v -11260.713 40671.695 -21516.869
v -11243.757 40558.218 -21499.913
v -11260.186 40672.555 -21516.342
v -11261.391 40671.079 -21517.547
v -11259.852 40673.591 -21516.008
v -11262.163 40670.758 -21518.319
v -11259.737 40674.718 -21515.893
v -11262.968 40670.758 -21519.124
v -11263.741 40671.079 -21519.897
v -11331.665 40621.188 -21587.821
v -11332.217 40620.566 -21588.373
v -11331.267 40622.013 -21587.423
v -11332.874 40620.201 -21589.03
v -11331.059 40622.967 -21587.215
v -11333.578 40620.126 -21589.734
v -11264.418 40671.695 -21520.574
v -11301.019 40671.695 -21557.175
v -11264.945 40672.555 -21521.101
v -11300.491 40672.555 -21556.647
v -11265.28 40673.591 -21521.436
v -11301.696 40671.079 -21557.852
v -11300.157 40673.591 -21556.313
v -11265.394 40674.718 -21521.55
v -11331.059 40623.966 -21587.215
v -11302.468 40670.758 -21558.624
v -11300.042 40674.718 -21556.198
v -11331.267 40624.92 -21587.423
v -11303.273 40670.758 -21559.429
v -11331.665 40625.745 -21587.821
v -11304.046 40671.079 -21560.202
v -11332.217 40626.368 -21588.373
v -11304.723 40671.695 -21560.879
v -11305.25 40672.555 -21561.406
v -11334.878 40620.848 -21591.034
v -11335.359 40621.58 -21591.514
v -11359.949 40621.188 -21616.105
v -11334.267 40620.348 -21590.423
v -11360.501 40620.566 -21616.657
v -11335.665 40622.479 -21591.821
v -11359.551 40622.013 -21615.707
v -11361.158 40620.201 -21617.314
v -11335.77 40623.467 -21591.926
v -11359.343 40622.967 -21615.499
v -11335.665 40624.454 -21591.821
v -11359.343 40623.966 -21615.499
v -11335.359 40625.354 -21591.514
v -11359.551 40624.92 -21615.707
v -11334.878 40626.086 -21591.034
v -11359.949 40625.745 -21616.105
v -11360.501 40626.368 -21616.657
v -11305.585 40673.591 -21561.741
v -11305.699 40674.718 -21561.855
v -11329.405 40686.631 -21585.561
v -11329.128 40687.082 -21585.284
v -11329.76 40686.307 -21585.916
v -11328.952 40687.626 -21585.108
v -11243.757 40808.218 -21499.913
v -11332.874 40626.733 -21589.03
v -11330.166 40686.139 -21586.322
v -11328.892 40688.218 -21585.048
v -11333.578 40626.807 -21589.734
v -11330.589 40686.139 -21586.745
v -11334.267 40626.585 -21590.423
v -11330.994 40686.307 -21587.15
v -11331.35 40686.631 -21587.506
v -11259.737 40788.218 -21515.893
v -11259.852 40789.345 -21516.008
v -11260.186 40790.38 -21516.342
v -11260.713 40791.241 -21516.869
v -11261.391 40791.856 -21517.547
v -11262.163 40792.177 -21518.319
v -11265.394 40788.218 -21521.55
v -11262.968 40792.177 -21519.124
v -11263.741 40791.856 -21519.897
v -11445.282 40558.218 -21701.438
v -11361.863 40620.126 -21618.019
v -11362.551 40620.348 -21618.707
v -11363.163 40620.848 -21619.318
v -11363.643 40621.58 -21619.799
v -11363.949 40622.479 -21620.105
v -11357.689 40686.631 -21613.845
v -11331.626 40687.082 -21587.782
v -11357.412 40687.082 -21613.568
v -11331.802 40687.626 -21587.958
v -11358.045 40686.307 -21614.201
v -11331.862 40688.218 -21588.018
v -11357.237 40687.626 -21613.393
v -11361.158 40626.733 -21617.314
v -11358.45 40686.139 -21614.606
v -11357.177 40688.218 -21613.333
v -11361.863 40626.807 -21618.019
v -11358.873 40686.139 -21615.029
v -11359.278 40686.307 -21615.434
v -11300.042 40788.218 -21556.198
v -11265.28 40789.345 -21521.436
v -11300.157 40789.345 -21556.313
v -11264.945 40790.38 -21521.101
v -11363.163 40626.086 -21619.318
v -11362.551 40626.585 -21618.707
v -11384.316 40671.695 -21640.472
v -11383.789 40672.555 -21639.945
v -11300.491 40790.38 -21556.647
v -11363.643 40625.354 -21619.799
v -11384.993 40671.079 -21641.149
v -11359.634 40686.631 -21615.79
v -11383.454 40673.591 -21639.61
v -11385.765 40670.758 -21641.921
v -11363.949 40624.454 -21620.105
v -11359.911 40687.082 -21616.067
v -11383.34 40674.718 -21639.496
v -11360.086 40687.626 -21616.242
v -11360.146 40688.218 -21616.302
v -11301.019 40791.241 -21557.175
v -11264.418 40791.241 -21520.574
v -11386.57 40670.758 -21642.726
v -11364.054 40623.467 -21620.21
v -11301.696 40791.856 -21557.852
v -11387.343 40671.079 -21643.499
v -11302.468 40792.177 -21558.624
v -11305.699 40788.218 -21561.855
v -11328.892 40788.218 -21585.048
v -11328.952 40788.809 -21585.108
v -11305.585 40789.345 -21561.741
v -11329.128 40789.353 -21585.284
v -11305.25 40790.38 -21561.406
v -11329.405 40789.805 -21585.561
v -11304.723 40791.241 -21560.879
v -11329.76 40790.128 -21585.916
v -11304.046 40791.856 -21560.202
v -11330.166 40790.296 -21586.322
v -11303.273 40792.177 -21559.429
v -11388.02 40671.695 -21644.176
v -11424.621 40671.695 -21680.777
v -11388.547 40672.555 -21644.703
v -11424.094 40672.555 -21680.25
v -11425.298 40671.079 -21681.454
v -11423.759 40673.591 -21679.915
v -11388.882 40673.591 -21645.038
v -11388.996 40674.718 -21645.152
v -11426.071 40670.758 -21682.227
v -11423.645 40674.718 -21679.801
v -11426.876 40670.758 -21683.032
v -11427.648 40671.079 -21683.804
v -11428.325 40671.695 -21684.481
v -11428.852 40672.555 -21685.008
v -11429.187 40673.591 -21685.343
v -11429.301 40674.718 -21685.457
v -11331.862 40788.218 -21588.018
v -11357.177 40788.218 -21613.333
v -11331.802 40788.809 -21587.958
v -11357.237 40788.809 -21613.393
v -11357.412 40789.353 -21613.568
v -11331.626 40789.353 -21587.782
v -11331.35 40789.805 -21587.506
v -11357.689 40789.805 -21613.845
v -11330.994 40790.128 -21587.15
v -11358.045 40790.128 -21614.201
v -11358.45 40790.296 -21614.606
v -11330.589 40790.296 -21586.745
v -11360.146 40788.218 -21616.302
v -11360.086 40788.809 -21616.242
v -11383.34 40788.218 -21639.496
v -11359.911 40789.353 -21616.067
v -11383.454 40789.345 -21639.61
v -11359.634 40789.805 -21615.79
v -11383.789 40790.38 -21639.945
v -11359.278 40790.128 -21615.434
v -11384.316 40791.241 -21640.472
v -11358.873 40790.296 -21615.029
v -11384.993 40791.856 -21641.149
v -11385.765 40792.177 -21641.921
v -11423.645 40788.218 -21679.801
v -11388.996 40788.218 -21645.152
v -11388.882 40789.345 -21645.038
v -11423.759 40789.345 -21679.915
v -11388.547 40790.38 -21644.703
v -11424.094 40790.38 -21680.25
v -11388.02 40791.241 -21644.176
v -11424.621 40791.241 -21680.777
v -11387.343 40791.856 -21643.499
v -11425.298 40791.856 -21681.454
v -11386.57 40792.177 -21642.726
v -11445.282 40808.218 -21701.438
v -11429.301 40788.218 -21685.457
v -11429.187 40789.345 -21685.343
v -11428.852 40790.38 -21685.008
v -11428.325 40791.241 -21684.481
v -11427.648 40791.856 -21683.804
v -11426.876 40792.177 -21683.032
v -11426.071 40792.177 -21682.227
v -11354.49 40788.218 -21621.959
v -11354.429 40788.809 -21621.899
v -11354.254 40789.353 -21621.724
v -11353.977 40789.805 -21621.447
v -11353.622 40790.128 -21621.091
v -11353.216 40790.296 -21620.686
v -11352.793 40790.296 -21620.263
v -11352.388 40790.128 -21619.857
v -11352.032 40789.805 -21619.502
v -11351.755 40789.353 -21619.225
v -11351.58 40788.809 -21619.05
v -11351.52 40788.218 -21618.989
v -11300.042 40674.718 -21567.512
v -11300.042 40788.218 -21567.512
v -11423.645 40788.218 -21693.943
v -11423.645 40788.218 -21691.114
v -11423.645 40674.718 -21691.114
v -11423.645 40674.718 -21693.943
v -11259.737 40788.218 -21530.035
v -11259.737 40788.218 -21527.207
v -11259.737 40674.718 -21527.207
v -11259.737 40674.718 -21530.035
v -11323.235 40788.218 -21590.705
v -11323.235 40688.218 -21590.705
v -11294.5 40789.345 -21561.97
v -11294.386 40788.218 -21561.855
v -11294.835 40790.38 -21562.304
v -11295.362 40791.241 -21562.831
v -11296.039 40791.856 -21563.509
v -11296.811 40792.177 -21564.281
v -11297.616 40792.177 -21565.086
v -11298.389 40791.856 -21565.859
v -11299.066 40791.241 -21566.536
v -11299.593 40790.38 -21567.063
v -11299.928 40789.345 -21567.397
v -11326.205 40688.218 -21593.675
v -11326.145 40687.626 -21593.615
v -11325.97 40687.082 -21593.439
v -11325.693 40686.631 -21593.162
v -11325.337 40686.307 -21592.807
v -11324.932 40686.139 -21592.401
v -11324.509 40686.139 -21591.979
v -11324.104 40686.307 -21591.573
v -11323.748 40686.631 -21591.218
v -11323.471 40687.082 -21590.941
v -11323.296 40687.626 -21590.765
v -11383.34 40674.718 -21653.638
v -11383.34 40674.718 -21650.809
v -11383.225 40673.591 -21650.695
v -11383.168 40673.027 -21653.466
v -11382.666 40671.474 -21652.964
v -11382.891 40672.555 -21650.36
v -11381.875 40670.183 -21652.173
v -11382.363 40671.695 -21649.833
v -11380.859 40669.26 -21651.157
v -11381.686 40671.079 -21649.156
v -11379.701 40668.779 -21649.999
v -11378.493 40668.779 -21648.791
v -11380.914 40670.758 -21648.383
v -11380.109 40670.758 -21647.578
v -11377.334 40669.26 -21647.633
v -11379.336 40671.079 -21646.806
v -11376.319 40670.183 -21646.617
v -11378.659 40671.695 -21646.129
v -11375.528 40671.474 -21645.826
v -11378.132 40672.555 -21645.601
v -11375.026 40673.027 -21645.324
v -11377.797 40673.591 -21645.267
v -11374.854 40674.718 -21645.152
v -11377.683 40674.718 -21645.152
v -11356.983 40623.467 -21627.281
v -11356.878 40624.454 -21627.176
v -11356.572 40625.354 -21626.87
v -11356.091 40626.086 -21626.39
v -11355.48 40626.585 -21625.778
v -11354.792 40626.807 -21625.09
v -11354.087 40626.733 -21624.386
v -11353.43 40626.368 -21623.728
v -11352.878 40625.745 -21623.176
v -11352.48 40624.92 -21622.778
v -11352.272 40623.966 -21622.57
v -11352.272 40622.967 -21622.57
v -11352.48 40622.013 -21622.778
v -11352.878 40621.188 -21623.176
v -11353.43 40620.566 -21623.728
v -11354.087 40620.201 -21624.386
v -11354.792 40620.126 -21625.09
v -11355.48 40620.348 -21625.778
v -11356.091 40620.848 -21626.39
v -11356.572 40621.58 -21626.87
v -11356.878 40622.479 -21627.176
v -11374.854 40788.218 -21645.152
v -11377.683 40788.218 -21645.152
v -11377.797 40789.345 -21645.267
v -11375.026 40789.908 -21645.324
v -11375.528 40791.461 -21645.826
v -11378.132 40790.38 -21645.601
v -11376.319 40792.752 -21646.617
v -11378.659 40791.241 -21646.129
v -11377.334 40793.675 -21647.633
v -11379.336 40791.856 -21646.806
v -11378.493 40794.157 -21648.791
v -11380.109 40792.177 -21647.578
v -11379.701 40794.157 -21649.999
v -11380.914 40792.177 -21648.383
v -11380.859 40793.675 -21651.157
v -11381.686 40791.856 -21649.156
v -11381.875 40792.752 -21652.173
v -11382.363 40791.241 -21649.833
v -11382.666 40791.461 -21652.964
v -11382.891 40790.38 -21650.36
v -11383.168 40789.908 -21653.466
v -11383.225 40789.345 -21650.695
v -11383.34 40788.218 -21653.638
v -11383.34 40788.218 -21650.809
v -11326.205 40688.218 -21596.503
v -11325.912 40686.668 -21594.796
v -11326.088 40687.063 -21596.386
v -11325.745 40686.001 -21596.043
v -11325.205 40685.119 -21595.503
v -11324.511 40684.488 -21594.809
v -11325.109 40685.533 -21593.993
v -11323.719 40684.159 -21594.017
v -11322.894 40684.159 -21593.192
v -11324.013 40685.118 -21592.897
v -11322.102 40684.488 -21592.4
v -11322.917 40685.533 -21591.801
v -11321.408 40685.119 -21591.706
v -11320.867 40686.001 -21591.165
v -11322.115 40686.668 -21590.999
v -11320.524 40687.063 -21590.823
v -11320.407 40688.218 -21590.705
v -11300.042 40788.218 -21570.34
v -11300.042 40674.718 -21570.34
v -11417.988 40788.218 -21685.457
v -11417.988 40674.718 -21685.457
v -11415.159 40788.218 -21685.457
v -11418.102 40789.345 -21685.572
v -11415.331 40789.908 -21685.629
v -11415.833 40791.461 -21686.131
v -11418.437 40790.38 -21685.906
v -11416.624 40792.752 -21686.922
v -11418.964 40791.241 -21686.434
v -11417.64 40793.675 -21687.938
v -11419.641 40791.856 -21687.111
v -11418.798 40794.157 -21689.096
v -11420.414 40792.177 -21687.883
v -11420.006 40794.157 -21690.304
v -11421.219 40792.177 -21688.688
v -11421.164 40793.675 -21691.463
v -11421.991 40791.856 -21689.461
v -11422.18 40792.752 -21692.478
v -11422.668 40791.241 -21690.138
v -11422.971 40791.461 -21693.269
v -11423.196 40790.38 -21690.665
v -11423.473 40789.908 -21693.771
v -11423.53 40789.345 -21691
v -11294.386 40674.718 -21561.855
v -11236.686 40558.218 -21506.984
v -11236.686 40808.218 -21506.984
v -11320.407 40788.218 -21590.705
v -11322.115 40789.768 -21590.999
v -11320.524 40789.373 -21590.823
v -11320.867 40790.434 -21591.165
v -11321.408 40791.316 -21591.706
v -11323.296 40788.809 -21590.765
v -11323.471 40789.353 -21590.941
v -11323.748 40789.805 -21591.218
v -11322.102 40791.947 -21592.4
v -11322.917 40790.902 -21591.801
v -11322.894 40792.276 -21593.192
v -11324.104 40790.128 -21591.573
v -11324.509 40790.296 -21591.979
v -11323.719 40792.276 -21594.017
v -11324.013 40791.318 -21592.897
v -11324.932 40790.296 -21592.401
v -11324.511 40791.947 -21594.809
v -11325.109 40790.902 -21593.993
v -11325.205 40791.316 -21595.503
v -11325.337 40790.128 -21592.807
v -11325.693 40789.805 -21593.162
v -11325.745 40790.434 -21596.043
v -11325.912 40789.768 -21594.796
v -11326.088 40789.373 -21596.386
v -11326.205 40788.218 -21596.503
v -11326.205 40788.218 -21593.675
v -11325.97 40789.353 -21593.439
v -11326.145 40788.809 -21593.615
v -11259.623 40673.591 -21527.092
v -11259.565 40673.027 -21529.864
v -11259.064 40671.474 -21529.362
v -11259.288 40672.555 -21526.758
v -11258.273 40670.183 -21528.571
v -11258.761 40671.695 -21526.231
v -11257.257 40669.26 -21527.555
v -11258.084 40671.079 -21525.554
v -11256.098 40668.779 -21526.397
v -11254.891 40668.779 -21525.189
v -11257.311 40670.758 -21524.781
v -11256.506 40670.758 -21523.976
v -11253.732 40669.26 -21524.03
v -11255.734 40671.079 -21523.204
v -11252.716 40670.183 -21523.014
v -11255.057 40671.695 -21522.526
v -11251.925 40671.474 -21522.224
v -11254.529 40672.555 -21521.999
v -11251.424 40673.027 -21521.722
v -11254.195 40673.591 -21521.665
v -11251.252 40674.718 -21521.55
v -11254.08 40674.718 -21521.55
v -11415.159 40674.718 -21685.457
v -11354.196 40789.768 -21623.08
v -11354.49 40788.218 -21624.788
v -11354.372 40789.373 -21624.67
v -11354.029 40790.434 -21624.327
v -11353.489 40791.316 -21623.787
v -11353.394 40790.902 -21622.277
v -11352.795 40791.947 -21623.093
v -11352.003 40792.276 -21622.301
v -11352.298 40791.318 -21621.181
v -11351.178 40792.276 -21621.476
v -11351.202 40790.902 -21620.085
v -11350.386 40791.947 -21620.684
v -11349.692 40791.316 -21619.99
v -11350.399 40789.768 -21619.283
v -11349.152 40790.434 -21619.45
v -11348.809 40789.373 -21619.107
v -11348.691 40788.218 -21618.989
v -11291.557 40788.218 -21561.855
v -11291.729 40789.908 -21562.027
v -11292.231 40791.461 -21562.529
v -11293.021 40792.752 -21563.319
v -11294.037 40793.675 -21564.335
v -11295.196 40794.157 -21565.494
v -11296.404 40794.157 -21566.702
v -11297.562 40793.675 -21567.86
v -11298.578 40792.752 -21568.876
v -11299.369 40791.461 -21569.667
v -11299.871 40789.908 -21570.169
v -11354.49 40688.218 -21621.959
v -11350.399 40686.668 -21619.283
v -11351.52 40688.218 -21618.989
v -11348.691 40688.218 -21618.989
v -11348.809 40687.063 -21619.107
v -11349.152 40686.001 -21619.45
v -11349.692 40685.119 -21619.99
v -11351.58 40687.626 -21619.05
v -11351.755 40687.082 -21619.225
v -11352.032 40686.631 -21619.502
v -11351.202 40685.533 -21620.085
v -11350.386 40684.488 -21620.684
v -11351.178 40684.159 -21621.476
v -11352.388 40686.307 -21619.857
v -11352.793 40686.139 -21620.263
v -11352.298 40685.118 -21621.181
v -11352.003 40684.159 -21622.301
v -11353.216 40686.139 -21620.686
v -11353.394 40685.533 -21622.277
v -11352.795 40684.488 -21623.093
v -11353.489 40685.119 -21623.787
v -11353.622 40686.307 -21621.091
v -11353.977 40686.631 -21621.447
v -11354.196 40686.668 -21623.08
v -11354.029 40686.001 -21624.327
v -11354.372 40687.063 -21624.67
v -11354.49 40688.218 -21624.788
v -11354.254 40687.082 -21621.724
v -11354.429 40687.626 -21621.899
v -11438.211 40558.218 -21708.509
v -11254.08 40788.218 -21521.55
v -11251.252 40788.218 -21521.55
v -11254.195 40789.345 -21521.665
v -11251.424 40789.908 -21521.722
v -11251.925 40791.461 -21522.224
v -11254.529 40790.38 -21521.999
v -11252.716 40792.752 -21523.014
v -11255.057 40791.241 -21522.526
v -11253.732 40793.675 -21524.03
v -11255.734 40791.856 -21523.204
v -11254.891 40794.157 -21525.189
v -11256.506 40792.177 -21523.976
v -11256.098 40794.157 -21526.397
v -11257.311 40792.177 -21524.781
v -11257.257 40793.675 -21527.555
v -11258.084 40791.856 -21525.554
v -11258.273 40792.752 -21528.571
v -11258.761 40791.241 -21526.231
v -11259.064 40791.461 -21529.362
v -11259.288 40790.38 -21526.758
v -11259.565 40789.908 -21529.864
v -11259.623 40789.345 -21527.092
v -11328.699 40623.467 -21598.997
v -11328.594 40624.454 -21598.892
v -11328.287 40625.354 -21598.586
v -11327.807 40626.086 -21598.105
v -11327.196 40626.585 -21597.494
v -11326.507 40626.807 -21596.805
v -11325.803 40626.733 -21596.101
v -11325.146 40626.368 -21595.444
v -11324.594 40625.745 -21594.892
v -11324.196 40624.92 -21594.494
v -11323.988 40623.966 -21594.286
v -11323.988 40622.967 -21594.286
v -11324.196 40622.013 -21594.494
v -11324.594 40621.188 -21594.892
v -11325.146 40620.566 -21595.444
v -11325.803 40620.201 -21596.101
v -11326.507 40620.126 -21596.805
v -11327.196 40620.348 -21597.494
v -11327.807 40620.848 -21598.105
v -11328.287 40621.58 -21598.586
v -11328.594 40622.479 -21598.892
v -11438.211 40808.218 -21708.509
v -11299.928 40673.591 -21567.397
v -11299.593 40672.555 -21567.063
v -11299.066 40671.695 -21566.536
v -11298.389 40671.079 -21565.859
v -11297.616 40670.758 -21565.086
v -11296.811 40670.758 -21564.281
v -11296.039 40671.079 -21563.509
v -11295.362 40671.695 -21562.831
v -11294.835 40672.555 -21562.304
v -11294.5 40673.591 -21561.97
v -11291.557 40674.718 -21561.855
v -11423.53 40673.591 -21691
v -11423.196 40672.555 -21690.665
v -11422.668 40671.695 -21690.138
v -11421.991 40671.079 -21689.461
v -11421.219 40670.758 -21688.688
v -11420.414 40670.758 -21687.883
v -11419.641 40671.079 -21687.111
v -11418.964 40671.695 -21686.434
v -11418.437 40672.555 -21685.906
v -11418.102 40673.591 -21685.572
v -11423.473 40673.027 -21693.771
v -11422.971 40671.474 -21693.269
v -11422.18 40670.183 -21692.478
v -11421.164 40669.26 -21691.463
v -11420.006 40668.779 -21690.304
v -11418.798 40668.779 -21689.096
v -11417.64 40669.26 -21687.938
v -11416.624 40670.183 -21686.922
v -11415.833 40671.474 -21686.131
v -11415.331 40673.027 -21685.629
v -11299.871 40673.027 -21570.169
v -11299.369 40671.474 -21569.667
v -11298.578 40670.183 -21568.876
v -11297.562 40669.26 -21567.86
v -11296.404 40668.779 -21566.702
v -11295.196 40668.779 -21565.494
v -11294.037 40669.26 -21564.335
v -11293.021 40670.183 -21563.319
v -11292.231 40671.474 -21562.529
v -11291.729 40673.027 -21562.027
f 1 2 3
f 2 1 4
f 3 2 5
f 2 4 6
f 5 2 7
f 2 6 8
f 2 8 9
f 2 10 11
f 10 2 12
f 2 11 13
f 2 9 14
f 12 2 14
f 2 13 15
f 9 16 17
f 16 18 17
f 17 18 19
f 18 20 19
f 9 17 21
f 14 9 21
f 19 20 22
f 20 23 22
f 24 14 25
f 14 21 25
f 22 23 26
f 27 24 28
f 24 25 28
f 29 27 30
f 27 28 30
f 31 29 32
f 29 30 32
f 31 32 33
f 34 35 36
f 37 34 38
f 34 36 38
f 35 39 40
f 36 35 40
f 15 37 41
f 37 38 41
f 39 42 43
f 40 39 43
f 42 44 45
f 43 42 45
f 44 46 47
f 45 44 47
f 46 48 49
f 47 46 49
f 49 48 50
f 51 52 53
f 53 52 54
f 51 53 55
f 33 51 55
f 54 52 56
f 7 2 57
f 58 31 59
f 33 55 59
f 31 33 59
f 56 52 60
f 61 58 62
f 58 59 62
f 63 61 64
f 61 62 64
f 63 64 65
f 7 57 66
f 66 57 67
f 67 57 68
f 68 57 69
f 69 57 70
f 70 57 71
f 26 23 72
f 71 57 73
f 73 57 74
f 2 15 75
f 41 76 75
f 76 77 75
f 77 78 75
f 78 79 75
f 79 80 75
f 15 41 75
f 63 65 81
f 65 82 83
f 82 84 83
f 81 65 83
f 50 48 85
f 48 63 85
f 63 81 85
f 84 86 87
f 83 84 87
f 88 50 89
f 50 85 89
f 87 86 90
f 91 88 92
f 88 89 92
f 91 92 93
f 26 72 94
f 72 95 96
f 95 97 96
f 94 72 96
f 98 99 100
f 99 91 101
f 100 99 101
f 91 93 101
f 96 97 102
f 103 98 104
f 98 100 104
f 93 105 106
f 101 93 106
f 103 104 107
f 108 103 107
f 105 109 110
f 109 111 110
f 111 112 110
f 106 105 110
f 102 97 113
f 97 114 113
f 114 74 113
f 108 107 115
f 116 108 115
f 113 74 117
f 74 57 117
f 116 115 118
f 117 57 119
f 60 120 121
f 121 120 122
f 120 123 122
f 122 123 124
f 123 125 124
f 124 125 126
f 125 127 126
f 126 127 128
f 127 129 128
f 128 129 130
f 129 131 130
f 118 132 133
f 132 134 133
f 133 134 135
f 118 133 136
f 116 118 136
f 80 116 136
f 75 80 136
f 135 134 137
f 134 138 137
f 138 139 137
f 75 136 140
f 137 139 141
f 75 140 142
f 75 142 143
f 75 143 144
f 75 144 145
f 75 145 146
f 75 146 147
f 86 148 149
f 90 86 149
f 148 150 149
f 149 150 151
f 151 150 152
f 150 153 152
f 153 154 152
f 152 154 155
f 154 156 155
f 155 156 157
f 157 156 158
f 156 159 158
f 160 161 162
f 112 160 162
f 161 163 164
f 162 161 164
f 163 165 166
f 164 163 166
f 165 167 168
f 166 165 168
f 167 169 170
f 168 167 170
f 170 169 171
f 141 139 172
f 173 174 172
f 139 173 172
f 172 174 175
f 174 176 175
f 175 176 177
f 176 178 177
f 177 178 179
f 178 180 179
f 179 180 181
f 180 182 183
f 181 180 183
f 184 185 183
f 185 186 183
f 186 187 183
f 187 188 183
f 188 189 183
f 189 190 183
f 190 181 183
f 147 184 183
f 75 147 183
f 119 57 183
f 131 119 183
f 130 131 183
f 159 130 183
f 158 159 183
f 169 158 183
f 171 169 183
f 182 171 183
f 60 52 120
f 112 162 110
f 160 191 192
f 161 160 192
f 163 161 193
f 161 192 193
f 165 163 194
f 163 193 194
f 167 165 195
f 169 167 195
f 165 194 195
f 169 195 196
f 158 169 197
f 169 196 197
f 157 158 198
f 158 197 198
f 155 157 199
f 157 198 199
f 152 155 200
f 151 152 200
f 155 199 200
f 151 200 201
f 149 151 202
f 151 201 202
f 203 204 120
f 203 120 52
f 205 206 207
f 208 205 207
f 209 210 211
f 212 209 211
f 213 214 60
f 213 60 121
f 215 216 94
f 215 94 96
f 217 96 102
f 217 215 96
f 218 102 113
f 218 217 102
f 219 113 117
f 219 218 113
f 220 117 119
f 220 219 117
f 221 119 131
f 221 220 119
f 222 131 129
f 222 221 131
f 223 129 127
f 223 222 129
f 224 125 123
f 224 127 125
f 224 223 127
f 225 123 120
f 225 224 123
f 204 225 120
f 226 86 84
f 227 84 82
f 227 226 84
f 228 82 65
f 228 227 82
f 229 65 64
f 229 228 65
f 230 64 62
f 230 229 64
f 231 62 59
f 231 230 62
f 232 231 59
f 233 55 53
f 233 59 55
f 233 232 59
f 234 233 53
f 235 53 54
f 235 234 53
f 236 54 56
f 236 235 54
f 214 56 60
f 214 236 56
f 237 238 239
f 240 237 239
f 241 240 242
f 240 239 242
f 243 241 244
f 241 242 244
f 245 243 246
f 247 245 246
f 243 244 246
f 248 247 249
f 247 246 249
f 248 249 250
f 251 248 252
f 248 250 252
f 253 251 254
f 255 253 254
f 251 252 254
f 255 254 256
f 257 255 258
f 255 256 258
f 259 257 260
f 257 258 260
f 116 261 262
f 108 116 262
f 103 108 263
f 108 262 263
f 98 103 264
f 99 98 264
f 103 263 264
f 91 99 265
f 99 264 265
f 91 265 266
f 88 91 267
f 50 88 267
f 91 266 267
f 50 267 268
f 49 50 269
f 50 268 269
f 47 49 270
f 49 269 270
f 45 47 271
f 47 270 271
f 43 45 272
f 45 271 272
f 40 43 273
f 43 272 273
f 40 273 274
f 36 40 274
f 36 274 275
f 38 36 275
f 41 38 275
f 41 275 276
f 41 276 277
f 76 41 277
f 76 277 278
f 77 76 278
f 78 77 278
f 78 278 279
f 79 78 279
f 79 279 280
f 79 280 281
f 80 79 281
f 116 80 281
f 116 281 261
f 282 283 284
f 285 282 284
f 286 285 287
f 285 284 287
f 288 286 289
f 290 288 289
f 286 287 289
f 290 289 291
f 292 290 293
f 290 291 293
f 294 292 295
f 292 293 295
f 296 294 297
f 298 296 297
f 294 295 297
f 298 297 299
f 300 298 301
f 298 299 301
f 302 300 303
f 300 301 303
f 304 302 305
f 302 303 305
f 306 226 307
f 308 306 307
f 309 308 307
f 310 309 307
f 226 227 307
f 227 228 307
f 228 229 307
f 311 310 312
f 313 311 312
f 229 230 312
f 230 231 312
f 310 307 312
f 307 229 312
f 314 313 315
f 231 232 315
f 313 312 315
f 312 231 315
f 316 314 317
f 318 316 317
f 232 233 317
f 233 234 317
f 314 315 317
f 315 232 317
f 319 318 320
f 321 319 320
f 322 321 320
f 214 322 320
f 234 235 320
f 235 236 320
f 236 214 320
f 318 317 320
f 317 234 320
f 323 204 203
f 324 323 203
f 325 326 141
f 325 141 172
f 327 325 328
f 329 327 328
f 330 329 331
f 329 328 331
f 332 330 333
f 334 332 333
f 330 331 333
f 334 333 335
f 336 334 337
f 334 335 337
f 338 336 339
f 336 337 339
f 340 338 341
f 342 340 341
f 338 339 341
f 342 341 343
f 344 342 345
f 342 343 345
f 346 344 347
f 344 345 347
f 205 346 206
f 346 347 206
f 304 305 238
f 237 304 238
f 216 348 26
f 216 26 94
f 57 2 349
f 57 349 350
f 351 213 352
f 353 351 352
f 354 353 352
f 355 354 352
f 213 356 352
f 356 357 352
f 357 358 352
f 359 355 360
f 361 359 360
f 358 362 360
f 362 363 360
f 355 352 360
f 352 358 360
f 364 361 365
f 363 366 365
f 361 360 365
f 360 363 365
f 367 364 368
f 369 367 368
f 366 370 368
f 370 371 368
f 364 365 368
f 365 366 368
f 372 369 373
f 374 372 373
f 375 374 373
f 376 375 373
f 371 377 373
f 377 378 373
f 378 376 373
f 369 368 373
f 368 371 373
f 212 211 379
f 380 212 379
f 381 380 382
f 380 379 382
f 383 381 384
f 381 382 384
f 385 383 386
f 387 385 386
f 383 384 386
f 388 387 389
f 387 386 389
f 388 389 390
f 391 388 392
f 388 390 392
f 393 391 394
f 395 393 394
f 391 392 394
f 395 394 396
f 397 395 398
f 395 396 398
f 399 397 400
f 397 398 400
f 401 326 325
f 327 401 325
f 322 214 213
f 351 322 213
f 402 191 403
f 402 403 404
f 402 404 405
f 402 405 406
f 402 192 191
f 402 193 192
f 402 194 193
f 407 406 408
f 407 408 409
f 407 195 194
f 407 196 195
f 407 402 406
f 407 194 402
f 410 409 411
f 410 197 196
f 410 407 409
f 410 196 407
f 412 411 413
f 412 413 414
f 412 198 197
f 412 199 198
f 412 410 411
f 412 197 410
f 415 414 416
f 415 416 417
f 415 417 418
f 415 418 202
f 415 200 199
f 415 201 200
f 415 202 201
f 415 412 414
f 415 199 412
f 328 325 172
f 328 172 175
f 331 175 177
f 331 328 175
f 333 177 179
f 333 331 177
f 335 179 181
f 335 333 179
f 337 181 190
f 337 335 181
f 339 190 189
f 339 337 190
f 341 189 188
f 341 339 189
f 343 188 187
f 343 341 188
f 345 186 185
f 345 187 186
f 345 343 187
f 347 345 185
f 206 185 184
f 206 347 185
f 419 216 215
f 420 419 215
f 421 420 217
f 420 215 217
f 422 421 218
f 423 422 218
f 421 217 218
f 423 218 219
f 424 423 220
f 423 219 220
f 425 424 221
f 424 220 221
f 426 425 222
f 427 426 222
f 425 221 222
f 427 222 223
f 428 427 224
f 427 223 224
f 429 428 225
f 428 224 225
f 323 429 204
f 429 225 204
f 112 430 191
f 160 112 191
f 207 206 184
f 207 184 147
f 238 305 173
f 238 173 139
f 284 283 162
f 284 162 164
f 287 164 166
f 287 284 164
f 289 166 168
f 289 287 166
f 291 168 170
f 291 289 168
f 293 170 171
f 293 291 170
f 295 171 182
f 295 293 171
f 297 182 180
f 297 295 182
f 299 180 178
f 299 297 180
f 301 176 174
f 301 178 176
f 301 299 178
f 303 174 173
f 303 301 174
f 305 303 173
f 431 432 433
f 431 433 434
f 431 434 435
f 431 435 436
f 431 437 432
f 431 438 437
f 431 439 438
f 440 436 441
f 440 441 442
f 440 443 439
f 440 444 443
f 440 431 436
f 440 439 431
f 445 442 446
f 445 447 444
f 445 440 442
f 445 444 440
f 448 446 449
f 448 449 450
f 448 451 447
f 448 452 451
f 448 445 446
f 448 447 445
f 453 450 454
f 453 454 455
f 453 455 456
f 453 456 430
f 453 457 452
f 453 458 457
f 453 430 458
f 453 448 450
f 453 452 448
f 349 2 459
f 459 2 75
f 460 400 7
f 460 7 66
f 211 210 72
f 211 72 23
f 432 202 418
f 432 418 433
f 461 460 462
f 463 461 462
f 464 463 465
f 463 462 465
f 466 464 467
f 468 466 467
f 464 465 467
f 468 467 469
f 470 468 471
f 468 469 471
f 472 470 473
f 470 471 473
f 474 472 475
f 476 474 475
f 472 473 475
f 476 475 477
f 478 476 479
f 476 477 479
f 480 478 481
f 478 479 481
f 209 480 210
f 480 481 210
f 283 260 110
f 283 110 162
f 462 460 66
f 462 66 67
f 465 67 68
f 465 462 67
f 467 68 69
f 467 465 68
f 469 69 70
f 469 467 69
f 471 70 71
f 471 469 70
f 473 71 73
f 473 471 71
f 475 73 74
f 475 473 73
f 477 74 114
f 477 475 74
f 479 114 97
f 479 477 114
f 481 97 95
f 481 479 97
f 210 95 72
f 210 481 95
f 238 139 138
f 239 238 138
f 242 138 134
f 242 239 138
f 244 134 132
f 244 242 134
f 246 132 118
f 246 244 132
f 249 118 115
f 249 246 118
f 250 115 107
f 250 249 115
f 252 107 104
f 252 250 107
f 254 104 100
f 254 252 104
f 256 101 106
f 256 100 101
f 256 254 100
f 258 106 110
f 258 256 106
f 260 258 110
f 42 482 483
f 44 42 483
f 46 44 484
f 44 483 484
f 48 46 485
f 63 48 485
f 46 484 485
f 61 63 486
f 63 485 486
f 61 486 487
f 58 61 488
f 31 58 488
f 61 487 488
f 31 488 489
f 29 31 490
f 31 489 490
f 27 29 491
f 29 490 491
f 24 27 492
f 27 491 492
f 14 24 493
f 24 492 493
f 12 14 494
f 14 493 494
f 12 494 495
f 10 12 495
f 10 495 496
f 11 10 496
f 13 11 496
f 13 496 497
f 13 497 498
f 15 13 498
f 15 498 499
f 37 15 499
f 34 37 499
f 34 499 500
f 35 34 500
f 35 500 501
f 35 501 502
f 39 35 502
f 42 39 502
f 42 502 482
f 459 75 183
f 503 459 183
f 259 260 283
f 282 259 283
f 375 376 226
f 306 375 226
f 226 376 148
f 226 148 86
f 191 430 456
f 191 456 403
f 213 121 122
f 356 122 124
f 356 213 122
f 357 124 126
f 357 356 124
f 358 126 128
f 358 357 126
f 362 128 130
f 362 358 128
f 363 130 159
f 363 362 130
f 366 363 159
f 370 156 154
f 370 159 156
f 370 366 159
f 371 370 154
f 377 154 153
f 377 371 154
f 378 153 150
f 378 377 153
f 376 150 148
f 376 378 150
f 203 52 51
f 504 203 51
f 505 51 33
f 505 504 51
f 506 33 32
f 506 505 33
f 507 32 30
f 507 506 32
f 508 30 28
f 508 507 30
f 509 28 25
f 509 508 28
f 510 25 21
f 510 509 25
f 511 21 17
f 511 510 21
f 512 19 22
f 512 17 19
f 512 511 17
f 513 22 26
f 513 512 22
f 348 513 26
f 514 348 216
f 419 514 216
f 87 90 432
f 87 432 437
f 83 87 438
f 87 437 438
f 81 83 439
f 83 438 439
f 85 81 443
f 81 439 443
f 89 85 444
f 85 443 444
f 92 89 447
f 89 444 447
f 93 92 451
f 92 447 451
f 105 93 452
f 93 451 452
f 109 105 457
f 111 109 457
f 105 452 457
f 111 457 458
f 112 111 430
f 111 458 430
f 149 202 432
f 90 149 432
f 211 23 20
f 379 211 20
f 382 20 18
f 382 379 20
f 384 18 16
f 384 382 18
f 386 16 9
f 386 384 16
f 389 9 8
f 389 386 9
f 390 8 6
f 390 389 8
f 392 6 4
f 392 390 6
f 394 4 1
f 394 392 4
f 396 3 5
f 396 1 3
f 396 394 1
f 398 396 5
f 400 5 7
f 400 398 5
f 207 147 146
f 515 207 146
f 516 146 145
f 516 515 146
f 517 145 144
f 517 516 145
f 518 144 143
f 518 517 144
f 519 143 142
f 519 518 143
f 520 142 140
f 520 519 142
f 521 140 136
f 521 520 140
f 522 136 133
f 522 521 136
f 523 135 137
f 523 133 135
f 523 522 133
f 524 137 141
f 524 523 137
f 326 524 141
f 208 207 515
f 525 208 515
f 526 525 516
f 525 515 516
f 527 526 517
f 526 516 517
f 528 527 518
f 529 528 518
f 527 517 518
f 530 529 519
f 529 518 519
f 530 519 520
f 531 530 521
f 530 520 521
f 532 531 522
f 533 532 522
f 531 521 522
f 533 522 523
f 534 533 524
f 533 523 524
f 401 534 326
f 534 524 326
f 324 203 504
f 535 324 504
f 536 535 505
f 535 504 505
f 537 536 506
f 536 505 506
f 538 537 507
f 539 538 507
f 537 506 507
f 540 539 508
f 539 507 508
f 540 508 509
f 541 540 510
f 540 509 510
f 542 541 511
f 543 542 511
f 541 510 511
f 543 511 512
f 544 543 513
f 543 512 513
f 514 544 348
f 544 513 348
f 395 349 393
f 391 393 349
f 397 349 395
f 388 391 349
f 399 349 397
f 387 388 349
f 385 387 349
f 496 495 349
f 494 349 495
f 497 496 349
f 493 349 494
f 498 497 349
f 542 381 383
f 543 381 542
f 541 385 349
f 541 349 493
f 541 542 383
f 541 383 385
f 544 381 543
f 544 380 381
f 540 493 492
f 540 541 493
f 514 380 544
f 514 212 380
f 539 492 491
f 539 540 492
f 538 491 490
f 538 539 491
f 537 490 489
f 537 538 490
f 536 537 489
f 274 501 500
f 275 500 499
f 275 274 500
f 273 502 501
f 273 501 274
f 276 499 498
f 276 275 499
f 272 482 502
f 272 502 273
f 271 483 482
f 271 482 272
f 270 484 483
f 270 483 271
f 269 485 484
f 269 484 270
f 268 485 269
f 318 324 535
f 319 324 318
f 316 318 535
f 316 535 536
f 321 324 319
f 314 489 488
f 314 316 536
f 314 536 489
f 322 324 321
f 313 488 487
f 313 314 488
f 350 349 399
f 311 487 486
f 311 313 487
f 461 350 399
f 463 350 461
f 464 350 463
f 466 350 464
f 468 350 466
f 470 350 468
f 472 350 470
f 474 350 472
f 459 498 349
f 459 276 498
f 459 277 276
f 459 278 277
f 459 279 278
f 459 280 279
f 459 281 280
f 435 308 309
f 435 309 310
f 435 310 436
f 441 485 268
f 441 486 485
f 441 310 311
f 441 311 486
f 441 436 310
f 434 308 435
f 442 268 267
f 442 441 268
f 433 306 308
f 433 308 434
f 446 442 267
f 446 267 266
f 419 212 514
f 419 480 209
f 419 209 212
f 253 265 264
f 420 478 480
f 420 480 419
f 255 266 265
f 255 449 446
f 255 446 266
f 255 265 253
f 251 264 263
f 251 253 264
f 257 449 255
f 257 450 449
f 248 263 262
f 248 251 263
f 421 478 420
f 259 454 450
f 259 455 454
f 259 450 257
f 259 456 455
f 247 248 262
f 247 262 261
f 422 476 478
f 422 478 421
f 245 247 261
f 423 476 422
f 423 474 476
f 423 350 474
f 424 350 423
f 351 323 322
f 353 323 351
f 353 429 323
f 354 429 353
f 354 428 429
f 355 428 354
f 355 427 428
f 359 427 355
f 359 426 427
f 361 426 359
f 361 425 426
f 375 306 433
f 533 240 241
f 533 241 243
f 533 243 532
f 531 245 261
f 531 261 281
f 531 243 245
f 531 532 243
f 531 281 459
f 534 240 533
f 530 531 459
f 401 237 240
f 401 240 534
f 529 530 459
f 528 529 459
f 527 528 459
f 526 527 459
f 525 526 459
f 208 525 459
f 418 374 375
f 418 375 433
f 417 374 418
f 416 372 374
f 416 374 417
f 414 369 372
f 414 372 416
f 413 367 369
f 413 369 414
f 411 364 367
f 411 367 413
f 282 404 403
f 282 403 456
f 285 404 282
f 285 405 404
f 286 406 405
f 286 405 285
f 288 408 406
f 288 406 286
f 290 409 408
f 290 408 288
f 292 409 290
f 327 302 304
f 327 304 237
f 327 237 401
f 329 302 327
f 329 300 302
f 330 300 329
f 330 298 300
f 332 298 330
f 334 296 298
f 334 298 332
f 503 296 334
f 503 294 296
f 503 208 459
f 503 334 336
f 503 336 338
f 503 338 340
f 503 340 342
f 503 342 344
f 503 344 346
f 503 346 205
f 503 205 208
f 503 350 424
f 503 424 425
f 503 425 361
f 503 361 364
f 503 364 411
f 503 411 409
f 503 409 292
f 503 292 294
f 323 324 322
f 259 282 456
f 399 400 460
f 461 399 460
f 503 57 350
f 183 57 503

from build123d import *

# Parameters (mm, degrees)
SKETCH1_W               = 285
SKETCH1_H               = 250
BOSS_EXTRUDE1_DEPTH     = 10
CUT_EXTRUDE1_DEPTH      = 143.5
CUT_EXTRUDE1_DEPTH_BACK = 153.5
CHAMFER1_SIZE           = 2
SKETCH6_R               = 3.35
CUT_EXTRUDE4_DEPTH      = 153.5


with BuildPart() as part:
    # Sketch1 → Boss-Extrude1 (new body)
    with BuildSketch(Plane(origin=(5128.077990588, 0, -5128.077990588), x_dir=(-0.707106781, 0, -0.707106781), z_dir=(0.707106781, 0, -0.707106781))):
        with Locations((23295.770603259, 40683.217604407)):
            Rectangle(SKETCH1_W, SKETCH1_H)
    extrude(amount=BOSS_EXTRUDE1_DEPTH)

    # Sketch2 → Cut-Extrude1 (cut, two sides)
    with BuildSketch(Plane(origin=(5135.1490584, 0, -5135.1490584), x_dir=(-0.707106781, 0, -0.707106781), z_dir=(0.707106781, 0, -0.707106781))) as cut_extrude1_sk:
        with BuildLine():
            Line((23183.870603259, 40788.217604407), (23183.870603259, 40674.717604407))
            ThreePointArc((23183.870603259, 40674.717604407), (23179.870603259, 40670.717604407), (23175.870603259, 40674.717604407))
            Line((23175.870603259, 40674.717604407), (23175.870603259, 40788.217604407))
            ThreePointArc((23175.870603259, 40788.217604407), (23179.870603259, 40792.217604407), (23183.870603259, 40788.217604407))
        make_face()
        with BuildLine():
            Line((23358.670603259, 40788.217604407), (23358.670603259, 40674.717604407))
            ThreePointArc((23358.670603259, 40674.717604407), (23354.670603259, 40670.717604407), (23350.670603259, 40674.717604407))
            Line((23350.670603259, 40674.717604407), (23350.670603259, 40788.217604407))
            ThreePointArc((23350.670603259, 40788.217604407), (23354.670603259, 40792.217604407), (23358.670603259, 40788.217604407))
        make_face()
        with BuildLine():
            Line((23240.870603259, 40788.217604407), (23240.870603259, 40674.717604407))
            ThreePointArc((23240.870603259, 40674.717604407), (23236.870603259, 40670.717604407), (23232.870603259, 40674.717604407))
            Line((23232.870603259, 40674.717604407), (23232.870603259, 40788.217604407))
            ThreePointArc((23232.870603259, 40788.217604407), (23236.870603259, 40792.217604407), (23240.870603259, 40788.217604407))
        make_face()
        with BuildLine():
            Line((23415.670603259, 40788.217604407), (23415.670603259, 40674.717604407))
            ThreePointArc((23415.670603259, 40674.717604407), (23411.670603259, 40670.717604407), (23407.670603259, 40674.717604407))
            Line((23407.670603259, 40674.717604407), (23407.670603259, 40788.217604407))
            ThreePointArc((23407.670603259, 40788.217604407), (23411.670603259, 40792.217604407), (23415.670603259, 40788.217604407))
        make_face()
        with BuildLine():
            Line((23277.870603259, 40788.217604407), (23277.870603259, 40688.217604407))
            ThreePointArc((23277.870603259, 40688.217604407), (23275.770603259, 40686.117604407), (23273.670603259, 40688.217604407))
            Line((23273.670603259, 40688.217604407), (23273.670603259, 40788.217604407))
            ThreePointArc((23273.670603259, 40788.217604407), (23275.770603259, 40790.317604407), (23277.870603259, 40788.217604407))
        make_face()
        with BuildLine():
            Line((23313.670603259, 40788.217604407), (23313.670603259, 40688.217604407))
            ThreePointArc((23313.670603259, 40688.217604407), (23315.770603259, 40686.117604407), (23317.870603259, 40688.217604407))
            Line((23317.870603259, 40688.217604407), (23317.870603259, 40788.217604407))
            ThreePointArc((23317.870603259, 40788.217604407), (23315.770603259, 40790.317604407), (23313.670603259, 40788.217604407))
        make_face()
    extrude(amount=CUT_EXTRUDE1_DEPTH, mode=Mode.SUBTRACT)
    extrude(cut_extrude1_sk.sketch, amount=-CUT_EXTRUDE1_DEPTH_BACK, mode=Mode.SUBTRACT)

    # Chamfer1
    chamfer1_edges = [part.edges().sort_by_distance(p)[0] for p in [
        (-11323.306172507, 40790.317604407, -21593.604289307),
        (-11324.791096747, 40738.217604407, -21595.089213547),
        (-11323.306172507, 40686.117604407, -21593.604289307),
        (-11321.821248266, 40738.217604407, -21592.119365066),
        (-11419.40198407, 40792.217604407, -21689.70010087),
        (-11422.230411195, 40731.467604407, -21692.528527995),
        (-11419.40198407, 40670.717604407, -21689.70010087),
        (-11416.573556945, 40731.467604407, -21686.871673745),
        (-11379.096897542, 40792.217604407, -21649.395014342),
        (-11381.925324667, 40731.467604407, -21652.223441467),
        (-11379.096897542, 40670.717604407, -21649.395014342),
        (-11376.268470418, 40731.467604407, -21646.566587218),
        (-11295.799718719, 40792.217604407, -21566.097835519),
        (-11298.628145844, 40731.467604407, -21568.926262643),
        (-11295.799718719, 40670.717604407, -21566.097835519),
        (-11292.971291594, 40731.467604407, -21563.269408394),
        (-11351.590443754, 40790.317604407, -21621.888560554),
        (-11353.075367995, 40738.217604407, -21623.373484795),
        (-11351.590443754, 40686.117604407, -21621.888560554),
        (-11350.105519514, 40738.217604407, -21620.403636314),
        (-11255.494632191, 40792.217604407, -21525.792748991),
        (-11258.323059316, 40731.467604407, -21528.621176116),
        (-11255.494632191, 40670.717604407, -21525.792748991),
        (-11252.666205067, 40731.467604407, -21522.964321866),
    ]]
    chamfer(chamfer1_edges, length=CHAMFER1_SIZE)

    # Sketch6 → Cut-Extrude4 (cut, through all)
    with BuildSketch(Plane(origin=(5135.1490584, 0, -5135.1490584), x_dir=(-0.707106781, 0, -0.707106781), z_dir=(0.707106781, 0, -0.707106781))):
        with Locations((23320.047276205, 40623.466763723)):
            Circle(SKETCH6_R)
        with Locations((23280.047276205, 40623.466763723)):
            Circle(SKETCH6_R)
    extrude(amount=-CUT_EXTRUDE4_DEPTH, mode=Mode.SUBTRACT)


solid = part.part
